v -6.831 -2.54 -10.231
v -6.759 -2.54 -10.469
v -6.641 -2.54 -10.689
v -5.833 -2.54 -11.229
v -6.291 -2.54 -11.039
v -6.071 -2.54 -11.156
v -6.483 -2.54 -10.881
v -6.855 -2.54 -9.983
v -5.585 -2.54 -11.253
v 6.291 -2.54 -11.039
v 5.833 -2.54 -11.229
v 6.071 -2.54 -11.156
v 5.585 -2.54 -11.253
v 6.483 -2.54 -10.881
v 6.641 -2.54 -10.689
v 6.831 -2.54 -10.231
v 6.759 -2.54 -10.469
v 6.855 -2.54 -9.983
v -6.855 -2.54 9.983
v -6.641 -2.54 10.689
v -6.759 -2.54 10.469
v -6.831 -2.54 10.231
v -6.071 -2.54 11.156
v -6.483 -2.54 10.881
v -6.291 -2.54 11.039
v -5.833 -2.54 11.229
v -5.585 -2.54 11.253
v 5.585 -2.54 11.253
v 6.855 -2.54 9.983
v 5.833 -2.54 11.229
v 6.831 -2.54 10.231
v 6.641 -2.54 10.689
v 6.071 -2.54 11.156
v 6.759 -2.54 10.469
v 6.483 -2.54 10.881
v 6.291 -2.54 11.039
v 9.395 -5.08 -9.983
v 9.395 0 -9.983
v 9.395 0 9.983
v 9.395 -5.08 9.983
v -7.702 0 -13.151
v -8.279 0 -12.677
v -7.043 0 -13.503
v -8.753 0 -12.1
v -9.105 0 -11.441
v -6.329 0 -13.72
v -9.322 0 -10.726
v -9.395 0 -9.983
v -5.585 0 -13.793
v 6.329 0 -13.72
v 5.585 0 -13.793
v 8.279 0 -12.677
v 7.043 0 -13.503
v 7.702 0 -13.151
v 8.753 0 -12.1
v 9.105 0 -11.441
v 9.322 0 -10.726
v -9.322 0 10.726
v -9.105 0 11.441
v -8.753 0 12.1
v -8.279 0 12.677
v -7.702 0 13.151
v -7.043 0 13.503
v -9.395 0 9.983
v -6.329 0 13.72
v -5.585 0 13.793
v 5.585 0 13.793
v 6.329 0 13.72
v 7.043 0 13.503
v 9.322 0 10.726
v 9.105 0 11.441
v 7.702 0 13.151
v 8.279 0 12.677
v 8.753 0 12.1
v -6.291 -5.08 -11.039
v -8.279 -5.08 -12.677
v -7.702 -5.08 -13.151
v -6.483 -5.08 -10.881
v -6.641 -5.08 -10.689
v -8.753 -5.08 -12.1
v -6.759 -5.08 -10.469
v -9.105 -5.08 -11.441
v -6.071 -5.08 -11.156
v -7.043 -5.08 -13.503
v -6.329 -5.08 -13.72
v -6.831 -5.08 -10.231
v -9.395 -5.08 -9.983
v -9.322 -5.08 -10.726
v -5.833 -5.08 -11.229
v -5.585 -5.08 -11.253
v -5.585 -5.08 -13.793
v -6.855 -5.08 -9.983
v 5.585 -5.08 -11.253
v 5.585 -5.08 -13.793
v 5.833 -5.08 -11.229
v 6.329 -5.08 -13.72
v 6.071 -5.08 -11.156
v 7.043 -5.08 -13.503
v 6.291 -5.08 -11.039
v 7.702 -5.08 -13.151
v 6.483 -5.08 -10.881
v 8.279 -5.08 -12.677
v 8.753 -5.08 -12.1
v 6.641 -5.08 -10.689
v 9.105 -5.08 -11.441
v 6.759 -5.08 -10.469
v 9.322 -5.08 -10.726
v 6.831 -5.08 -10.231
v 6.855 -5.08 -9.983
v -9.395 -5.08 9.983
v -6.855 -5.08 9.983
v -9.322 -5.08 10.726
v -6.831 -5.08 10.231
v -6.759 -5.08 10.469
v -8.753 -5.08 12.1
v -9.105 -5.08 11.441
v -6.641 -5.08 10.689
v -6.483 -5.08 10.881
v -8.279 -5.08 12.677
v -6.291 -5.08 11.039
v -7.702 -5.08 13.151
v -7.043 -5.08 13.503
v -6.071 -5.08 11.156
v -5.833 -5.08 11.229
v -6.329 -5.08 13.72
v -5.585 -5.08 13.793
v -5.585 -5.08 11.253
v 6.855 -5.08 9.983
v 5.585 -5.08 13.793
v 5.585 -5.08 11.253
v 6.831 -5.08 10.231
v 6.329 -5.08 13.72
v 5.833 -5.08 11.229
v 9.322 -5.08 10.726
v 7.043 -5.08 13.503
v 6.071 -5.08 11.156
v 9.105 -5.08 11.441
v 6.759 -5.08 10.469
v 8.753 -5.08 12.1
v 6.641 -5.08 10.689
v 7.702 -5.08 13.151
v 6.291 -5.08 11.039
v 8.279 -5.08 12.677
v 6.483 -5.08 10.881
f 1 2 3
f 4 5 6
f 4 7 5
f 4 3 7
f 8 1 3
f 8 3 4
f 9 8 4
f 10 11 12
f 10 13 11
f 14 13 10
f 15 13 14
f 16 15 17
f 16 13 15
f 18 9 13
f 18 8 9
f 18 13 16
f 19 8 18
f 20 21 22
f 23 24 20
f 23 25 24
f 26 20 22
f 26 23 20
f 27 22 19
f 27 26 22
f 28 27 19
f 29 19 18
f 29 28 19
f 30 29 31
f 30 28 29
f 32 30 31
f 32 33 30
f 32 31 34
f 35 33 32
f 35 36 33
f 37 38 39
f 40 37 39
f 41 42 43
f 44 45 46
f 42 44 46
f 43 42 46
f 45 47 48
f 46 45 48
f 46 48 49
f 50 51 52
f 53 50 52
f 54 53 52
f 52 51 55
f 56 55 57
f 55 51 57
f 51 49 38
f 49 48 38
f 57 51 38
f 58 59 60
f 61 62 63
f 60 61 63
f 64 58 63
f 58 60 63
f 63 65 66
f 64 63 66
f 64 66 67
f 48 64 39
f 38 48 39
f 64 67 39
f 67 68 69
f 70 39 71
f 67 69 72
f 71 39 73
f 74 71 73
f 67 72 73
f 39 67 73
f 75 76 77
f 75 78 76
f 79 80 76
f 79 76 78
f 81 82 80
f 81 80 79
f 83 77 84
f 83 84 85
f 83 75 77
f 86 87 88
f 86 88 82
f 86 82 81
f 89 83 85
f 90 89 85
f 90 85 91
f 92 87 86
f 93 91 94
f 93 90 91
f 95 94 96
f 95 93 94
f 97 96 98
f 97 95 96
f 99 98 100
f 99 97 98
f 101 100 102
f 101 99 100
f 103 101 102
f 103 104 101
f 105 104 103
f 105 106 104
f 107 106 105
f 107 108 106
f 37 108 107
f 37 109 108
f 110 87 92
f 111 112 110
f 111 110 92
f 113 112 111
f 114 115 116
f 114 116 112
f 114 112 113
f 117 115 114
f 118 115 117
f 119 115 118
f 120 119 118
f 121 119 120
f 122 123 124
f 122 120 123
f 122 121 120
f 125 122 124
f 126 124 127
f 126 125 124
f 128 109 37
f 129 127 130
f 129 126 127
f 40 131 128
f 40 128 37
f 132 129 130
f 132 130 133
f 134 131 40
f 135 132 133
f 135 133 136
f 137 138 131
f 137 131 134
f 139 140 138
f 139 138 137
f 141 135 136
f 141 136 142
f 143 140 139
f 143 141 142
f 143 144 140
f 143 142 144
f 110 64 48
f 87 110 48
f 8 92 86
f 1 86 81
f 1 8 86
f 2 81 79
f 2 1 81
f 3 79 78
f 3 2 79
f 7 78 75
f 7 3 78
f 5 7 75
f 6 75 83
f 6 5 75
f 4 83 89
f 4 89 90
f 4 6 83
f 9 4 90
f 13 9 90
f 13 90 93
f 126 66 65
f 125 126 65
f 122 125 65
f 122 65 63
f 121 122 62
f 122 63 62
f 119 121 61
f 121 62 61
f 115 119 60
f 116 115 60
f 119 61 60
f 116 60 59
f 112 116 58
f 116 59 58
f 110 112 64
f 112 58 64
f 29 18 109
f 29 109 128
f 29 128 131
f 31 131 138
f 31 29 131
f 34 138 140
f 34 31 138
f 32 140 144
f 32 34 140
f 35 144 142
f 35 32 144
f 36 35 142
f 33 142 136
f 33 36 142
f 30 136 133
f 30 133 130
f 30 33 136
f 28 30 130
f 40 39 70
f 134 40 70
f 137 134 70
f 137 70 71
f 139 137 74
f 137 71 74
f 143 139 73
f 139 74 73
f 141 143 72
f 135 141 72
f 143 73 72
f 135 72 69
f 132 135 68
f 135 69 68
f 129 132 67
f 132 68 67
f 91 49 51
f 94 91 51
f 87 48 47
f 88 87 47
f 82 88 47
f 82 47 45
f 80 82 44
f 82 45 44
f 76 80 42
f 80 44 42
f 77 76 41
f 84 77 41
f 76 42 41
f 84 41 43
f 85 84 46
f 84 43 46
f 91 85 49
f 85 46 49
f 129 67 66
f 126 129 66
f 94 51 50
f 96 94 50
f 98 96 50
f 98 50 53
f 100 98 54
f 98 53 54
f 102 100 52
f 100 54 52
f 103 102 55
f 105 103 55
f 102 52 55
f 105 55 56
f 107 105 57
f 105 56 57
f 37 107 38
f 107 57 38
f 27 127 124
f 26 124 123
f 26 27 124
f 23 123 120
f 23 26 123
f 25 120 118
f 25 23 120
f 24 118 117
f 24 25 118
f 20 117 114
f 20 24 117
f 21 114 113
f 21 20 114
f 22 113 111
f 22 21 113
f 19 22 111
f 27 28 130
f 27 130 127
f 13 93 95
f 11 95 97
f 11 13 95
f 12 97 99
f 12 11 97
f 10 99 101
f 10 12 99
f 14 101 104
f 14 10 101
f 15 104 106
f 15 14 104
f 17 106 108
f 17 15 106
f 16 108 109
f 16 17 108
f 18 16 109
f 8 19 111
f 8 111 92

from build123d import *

# Parameters (mm, degrees)
F1_DEPTH = 5.08
F2_T     = -2.54


with BuildPart() as f1:
    # F0 (on Front) → F1 (new body)
    with BuildSketch(Plane.XZ):
        with BuildLine():
            Line((-5.585341, -13.793164), (5.585341, -13.793164))
            ThreePointArc((5.585341, -13.793164), (8.279418, -12.677241), (9.395341, -9.983164))
            Line((9.395341, -9.983164), (9.395341, 9.983164))
            ThreePointArc((9.395341, 9.983164), (8.279418, 12.677241), (5.585341, 13.793164))
            Line((5.585341, 13.793164), (-5.585341, 13.793164))
            ThreePointArc((-5.585341, 13.793164), (-8.279418, 12.677241), (-9.395341, 9.983164))
            Line((-9.395341, 9.983164), (-9.395341, -9.983164))
            ThreePointArc((-9.395341, -9.983164), (-8.279418, -12.677241), (-5.585341, -13.793164))
        make_face()
    extrude(amount=F1_DEPTH)

    # F2
    f2_openings = [f1.faces().sort_by_distance(p)[0] for p in [
        (0, -5.08, 0),
    ]]
    offset(amount=F2_T, openings=f2_openings)


solid = f1.part
